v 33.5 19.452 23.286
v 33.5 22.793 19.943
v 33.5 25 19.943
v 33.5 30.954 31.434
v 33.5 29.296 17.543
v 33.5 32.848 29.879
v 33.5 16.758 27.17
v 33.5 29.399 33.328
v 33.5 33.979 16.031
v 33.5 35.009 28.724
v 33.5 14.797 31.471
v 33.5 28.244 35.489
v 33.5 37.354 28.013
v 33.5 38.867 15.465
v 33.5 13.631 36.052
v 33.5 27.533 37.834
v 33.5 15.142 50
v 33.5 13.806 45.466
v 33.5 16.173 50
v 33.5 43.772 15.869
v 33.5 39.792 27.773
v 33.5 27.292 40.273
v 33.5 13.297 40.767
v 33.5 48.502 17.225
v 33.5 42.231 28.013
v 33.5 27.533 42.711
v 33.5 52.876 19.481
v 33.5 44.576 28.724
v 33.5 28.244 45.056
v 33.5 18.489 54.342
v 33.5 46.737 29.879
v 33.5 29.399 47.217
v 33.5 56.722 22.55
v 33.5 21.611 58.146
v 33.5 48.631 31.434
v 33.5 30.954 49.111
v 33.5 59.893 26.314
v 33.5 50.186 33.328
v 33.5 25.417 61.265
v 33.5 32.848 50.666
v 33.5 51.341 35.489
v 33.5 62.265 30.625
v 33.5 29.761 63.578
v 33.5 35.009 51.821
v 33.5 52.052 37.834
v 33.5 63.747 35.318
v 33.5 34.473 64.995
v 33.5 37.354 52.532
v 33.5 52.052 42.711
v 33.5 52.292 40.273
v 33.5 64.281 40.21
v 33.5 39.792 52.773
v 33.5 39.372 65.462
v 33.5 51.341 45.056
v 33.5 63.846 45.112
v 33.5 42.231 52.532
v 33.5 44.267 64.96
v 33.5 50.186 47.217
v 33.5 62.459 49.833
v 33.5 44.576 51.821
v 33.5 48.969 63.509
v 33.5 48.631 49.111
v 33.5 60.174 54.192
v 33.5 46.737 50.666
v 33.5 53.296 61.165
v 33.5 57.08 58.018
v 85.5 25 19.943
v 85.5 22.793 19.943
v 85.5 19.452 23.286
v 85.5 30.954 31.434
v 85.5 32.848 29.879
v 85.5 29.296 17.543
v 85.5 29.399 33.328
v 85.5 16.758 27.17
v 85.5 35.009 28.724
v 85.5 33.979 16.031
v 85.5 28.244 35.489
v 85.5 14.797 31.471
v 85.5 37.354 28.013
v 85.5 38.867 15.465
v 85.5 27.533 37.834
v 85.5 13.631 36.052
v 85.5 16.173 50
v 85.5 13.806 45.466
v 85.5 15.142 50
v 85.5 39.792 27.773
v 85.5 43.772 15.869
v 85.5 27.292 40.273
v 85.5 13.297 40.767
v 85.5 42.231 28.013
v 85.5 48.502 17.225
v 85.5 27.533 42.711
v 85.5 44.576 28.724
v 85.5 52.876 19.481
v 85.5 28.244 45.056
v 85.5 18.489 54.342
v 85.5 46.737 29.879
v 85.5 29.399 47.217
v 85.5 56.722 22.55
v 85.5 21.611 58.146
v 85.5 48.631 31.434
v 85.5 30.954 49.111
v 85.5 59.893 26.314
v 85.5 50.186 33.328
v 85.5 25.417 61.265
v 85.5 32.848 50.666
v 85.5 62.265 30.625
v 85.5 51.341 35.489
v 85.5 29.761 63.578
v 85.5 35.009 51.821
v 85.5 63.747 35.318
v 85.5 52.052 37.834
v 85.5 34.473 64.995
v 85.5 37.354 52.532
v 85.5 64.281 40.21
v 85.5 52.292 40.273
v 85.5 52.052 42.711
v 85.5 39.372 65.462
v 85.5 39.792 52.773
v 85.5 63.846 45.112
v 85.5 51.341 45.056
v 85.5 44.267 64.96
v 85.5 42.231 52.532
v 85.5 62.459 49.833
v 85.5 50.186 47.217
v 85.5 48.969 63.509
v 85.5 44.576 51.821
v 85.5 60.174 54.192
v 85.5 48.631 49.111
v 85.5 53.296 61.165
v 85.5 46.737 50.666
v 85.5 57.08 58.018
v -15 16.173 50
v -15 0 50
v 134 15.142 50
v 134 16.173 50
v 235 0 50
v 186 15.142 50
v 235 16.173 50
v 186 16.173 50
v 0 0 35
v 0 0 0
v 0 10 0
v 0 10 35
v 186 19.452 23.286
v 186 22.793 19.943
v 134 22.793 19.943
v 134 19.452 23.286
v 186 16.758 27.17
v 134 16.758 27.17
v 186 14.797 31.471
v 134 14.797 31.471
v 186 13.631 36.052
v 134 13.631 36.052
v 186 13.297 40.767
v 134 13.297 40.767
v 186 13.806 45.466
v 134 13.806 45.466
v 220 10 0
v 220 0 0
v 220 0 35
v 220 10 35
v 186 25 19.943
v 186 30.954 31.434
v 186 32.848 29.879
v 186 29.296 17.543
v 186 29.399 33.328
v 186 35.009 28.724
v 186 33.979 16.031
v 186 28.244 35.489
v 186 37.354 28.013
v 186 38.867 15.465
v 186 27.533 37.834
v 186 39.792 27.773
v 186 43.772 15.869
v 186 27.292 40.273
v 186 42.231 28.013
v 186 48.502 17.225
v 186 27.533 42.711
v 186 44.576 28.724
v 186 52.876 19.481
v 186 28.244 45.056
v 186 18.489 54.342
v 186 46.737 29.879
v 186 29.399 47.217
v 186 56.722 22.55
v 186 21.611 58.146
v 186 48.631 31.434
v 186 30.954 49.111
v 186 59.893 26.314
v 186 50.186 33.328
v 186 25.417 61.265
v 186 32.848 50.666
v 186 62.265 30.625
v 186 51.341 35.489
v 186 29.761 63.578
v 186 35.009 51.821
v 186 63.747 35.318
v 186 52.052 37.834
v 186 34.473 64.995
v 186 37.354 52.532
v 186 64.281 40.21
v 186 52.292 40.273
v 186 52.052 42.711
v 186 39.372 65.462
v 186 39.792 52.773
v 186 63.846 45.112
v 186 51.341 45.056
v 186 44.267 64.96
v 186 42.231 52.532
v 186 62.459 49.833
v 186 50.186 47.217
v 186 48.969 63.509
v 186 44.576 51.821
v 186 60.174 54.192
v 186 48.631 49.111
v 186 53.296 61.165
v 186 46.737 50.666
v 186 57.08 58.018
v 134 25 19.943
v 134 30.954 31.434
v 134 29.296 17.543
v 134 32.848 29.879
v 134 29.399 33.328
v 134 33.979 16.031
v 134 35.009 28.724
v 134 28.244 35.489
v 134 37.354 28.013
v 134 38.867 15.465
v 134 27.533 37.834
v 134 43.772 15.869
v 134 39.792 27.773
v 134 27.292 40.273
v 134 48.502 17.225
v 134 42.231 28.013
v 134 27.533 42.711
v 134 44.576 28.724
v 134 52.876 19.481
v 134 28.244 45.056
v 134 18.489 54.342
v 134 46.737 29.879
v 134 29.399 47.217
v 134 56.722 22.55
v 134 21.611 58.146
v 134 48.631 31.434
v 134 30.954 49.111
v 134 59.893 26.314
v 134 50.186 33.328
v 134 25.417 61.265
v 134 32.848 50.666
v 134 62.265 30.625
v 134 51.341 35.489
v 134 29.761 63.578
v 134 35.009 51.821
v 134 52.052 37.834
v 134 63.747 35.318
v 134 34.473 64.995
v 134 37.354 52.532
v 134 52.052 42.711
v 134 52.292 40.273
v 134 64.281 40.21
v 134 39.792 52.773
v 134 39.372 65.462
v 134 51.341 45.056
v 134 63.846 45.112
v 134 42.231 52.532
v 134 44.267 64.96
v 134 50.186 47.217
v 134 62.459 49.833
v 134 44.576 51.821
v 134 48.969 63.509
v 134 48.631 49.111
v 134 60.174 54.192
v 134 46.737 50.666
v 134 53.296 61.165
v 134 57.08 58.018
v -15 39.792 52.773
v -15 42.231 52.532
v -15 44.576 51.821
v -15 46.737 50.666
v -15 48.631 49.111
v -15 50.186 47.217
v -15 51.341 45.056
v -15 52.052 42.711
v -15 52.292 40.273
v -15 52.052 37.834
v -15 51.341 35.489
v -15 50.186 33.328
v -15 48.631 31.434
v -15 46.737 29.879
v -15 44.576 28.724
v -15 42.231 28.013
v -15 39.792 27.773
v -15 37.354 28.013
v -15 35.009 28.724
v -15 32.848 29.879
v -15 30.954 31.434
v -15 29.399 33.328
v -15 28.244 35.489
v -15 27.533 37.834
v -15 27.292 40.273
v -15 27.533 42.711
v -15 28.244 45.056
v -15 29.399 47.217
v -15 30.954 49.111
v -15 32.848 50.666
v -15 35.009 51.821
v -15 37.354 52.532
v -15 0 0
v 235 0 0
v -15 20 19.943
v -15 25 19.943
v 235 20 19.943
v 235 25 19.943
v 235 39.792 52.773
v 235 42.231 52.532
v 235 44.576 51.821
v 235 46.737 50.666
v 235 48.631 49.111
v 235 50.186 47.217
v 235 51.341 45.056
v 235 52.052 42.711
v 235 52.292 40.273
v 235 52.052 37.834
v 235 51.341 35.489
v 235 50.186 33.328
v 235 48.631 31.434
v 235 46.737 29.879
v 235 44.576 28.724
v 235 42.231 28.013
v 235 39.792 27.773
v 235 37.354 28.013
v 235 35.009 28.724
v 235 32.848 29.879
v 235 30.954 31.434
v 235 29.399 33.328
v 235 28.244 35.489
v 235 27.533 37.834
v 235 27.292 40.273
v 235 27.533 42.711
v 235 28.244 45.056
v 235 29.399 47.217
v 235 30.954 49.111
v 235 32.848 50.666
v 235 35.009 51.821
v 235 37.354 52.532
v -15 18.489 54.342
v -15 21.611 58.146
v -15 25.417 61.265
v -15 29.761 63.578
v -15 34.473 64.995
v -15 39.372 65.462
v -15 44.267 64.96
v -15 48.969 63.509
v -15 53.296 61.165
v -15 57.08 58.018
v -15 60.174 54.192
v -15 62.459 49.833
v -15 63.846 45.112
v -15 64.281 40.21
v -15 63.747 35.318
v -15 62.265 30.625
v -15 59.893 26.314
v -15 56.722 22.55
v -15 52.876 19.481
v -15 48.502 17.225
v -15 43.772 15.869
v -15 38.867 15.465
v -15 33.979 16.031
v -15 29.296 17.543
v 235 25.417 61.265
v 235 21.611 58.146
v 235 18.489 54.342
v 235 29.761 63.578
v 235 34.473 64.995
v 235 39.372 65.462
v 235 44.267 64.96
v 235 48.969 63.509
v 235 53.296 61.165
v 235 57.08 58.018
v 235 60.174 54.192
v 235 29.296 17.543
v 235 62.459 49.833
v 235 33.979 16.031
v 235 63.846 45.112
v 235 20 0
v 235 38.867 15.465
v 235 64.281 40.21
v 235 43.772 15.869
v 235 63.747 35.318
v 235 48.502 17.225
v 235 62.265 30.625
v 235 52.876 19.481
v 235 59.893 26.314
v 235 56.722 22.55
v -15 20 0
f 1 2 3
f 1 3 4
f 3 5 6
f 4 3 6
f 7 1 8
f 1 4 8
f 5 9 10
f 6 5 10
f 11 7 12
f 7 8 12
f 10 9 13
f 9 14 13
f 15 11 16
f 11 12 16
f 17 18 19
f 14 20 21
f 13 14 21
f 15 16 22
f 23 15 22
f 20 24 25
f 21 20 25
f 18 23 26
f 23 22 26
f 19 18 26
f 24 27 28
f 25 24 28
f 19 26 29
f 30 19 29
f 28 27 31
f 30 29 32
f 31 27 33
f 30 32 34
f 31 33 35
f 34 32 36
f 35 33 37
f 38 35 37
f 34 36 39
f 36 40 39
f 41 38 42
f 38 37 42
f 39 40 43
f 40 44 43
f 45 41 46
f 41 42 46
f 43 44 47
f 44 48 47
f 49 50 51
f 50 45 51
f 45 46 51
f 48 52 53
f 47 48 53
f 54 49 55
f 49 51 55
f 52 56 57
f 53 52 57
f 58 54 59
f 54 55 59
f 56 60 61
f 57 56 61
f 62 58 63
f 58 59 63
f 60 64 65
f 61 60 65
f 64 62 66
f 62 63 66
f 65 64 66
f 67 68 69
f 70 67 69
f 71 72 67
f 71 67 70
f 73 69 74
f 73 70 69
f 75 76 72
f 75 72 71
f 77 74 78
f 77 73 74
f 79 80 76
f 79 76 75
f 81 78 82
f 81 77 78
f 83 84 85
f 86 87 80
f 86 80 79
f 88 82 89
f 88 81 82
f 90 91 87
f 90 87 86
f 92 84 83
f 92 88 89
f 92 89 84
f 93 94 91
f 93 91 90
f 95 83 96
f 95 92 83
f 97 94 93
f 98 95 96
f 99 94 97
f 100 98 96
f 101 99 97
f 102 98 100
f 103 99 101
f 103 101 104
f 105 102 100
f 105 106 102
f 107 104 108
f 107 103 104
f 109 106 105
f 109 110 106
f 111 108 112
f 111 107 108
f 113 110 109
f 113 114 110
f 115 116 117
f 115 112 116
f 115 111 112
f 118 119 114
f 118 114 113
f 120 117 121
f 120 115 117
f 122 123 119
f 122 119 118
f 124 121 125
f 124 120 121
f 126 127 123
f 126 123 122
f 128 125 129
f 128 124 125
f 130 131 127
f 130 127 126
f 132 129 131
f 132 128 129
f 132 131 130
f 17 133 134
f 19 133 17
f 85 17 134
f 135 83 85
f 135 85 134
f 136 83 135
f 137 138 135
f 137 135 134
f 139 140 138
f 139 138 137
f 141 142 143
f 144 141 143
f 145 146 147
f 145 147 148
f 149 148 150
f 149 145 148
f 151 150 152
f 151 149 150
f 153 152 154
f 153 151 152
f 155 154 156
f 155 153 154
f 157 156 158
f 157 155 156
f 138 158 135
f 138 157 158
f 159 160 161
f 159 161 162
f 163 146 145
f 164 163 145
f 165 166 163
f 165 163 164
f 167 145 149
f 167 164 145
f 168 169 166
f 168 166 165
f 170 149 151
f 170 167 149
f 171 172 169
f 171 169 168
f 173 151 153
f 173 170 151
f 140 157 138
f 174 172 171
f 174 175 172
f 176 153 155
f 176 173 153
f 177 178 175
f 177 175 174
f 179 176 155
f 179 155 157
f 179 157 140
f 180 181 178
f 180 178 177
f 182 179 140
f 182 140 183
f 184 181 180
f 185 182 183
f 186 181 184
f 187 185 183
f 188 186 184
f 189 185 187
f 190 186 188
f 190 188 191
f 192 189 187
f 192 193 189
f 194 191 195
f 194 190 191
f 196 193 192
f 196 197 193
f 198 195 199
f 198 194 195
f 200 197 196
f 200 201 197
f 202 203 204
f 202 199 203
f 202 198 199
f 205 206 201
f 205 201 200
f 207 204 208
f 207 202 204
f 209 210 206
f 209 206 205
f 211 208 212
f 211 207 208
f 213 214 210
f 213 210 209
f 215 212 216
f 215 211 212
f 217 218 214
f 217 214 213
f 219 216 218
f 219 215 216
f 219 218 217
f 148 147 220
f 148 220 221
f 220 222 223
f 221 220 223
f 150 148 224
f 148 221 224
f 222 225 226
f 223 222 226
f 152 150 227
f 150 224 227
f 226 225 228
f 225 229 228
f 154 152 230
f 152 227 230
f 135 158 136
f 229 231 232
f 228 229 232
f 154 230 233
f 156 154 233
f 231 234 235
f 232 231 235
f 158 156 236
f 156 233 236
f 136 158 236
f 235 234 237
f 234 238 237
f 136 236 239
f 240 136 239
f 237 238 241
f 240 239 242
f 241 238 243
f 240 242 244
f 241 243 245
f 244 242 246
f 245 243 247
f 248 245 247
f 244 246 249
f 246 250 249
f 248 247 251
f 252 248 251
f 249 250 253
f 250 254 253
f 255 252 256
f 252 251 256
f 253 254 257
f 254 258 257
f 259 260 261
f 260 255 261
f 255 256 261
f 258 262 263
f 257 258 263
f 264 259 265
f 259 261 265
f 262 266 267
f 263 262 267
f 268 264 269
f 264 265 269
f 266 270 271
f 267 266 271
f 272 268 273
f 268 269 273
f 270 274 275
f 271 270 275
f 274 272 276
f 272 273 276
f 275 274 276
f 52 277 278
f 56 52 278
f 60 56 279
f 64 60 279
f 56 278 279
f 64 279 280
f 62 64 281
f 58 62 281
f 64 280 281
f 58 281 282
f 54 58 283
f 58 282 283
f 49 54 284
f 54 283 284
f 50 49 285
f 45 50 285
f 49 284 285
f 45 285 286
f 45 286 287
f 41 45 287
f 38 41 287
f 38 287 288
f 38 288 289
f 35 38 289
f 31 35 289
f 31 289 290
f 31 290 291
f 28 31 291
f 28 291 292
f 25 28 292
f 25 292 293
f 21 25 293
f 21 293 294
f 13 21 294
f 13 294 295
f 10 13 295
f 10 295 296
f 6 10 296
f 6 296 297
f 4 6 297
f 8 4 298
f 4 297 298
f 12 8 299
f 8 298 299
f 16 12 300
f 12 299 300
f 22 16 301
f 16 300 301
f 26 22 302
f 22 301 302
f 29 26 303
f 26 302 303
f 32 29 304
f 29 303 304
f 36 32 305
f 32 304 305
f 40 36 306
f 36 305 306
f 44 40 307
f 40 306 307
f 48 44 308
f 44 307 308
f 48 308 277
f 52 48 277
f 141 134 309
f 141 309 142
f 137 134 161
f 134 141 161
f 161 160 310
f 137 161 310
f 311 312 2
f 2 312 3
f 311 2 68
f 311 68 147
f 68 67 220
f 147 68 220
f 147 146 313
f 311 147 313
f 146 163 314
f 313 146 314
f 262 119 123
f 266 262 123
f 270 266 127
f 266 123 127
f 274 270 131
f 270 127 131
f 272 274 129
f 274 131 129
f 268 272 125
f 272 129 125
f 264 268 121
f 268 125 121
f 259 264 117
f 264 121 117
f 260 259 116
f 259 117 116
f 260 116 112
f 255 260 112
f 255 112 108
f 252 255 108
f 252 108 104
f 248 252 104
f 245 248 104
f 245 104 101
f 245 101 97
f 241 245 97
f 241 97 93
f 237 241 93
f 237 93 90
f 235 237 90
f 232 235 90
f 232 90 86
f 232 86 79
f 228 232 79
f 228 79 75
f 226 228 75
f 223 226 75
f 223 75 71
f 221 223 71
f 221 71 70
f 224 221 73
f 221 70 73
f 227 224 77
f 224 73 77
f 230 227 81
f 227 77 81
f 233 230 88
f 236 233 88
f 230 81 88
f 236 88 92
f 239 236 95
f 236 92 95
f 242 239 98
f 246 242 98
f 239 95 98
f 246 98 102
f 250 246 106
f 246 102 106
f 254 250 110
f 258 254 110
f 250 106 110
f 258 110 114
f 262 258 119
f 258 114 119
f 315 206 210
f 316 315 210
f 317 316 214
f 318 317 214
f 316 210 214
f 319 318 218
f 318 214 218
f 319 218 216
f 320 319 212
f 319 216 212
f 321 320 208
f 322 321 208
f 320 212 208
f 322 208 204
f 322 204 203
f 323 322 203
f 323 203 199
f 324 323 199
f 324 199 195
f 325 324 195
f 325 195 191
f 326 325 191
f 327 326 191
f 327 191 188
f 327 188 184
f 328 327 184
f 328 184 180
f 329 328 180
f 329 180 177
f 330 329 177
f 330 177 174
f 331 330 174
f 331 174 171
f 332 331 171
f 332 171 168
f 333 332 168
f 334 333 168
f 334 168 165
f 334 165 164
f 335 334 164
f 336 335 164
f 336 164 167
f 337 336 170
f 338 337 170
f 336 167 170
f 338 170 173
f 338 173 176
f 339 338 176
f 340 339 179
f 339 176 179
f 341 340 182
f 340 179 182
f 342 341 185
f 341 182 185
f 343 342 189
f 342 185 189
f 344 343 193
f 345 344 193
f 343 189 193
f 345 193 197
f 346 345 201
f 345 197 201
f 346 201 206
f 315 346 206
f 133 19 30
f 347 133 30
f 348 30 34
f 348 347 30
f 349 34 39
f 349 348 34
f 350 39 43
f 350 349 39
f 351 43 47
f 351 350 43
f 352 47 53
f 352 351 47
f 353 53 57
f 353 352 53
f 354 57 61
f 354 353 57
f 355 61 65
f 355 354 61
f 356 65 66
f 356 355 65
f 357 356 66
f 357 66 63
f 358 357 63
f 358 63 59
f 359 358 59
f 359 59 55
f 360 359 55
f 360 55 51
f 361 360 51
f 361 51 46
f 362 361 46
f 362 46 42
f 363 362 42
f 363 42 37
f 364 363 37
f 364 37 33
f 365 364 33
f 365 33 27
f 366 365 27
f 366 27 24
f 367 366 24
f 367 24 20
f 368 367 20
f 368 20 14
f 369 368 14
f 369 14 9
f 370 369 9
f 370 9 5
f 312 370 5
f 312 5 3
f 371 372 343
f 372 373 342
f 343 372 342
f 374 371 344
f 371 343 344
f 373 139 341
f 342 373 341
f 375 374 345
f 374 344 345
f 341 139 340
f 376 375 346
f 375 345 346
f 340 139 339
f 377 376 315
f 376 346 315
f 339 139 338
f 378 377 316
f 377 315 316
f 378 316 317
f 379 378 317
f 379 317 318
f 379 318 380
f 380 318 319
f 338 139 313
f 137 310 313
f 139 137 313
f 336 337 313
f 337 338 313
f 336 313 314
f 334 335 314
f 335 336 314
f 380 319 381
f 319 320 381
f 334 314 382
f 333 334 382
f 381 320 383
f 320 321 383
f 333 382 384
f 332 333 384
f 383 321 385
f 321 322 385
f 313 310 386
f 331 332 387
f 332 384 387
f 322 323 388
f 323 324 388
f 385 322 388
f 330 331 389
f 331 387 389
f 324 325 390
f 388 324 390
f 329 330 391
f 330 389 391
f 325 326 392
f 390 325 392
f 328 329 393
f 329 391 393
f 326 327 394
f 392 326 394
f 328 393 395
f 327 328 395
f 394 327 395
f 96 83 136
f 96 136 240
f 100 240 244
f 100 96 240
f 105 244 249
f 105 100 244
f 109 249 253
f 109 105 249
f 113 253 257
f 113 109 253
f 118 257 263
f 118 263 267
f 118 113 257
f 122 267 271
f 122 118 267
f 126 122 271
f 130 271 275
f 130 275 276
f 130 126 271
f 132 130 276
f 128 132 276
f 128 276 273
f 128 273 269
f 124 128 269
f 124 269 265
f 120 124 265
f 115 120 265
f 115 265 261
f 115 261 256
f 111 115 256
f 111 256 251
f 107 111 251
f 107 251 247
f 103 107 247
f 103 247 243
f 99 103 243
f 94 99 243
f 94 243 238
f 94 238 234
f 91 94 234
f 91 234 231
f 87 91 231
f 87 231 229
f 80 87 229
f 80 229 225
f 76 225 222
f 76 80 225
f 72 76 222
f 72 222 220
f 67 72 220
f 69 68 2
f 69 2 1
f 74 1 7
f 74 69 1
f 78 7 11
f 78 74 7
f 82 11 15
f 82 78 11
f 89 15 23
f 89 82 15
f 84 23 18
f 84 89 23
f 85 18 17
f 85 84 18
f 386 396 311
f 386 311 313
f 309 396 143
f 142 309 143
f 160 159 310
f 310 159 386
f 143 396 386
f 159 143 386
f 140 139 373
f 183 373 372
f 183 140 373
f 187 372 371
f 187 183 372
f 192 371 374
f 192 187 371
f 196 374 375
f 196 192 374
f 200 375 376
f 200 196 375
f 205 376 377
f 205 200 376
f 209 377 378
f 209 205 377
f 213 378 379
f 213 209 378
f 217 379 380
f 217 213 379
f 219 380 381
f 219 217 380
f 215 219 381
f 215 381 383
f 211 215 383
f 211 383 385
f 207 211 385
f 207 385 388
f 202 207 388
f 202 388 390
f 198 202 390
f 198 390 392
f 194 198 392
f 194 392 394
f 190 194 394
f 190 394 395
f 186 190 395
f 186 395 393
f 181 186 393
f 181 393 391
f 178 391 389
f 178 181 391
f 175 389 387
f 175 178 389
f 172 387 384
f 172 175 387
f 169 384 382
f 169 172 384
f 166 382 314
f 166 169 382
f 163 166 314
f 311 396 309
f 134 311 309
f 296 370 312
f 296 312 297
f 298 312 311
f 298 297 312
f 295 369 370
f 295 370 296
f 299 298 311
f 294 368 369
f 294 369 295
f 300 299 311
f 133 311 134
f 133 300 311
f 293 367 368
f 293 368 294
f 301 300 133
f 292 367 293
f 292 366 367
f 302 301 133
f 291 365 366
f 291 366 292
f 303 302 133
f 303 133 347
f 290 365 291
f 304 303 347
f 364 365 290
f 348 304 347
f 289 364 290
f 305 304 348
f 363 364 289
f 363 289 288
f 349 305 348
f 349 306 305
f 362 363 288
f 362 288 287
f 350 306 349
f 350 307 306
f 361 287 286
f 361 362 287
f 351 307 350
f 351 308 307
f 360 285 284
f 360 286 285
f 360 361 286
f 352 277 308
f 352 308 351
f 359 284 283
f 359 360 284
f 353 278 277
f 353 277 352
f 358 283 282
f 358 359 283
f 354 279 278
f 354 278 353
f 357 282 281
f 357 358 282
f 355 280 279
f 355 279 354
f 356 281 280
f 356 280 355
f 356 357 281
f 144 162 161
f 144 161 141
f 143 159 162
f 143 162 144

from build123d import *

# Parameters (mm, degrees)
SKETCH1_W           = 250
SKETCH1_H           = 25
BOSS_EXTRUDE1_DEPTH = 50
SKETCH2_W           = 220
SKETCH2_H           = 10
CUT_EXTRUDE1_DEPTH  = 35
SKETCH3_R           = 25
BOSS_EXTRUDE2_DEPTH = 49
LPATTERN1_COUNT     = 3
LPATTERN1_PITCH     = 100.5
SKETCH7_R           = 12.5
CUT_EXTRUDE2_DEPTH  = 250
SKETCH8_W           = 250
SKETCH8_H           = 19.943004224
CUT_EXTRUDE3_DEPTH  = 5
SKETCH10_R          = 26.5
CUT_EXTRUDE4_DEPTH  = 52
SKETCH15_R          = 26.5
CUT_EXTRUDE5_DEPTH  = 52


with BuildPart() as part:
    # Sketch1 → Boss-Extrude1 (new body)
    with BuildSketch(Plane.XY):
        with Locations((110, 12.5)):
            Rectangle(SKETCH1_W, SKETCH1_H)
    extrude(amount=BOSS_EXTRUDE1_DEPTH)

    # Sketch2 → Cut-Extrude1 (cut)
    with BuildSketch(Plane(origin=(0, 0, 0), x_dir=(-1, 0, 0), z_dir=(0, 0, -1))):
        with Locations((-110, 5)):
            Rectangle(SKETCH2_W, SKETCH2_H)
    extrude(amount=-CUT_EXTRUDE1_DEPTH, mode=Mode.SUBTRACT)

    # Sketch3 → Boss-Extrude2 (add)
    with BuildSketch(Plane.ZY.offset(15)):
        with Locations((40.462008594, 39.281822702)):
            Circle(SKETCH3_R)
    boss_extrude2 = extrude(amount=-BOSS_EXTRUDE2_DEPTH)

    # LPattern1: Boss-Extrude2 ×3
    with Locations(*[(i * LPATTERN1_PITCH, 0, 0) for i in range(1, LPATTERN1_COUNT)]):
        add(boss_extrude2)

    # Sketch7 → Cut-Extrude2 (cut)
    with BuildSketch(Plane.ZY.offset(15)):
        with Locations((40.272500431, 39.79236851)):
            Circle(SKETCH7_R)
    extrude(amount=-CUT_EXTRUDE2_DEPTH, mode=Mode.SUBTRACT)

    # Sketch8 → Cut-Extrude3 (cut)
    with BuildSketch(Plane(origin=(0, 25, 0), x_dir=(1, 0, 0), z_dir=(0, 1, 0))):
        with Locations((110, -9.971502112)):
            Rectangle(SKETCH8_W, SKETCH8_H)
    extrude(amount=-CUT_EXTRUDE3_DEPTH, mode=Mode.SUBTRACT)

    # Sketch10 → Cut-Extrude4 (cut)
    with BuildSketch(Plane.ZY.offset(-85.5)):
        with Locations((40.272500431, 39.79236851)):
            Circle(SKETCH10_R)
    extrude(amount=CUT_EXTRUDE4_DEPTH, mode=Mode.SUBTRACT)

    # Sketch15 → Cut-Extrude5 (cut)
    with BuildSketch(Plane.ZY.offset(-186)):
        with Locations((40.272500431, 39.79236851)):
            Circle(SKETCH15_R)
    extrude(amount=CUT_EXTRUDE5_DEPTH, mode=Mode.SUBTRACT)


solid = part.part
